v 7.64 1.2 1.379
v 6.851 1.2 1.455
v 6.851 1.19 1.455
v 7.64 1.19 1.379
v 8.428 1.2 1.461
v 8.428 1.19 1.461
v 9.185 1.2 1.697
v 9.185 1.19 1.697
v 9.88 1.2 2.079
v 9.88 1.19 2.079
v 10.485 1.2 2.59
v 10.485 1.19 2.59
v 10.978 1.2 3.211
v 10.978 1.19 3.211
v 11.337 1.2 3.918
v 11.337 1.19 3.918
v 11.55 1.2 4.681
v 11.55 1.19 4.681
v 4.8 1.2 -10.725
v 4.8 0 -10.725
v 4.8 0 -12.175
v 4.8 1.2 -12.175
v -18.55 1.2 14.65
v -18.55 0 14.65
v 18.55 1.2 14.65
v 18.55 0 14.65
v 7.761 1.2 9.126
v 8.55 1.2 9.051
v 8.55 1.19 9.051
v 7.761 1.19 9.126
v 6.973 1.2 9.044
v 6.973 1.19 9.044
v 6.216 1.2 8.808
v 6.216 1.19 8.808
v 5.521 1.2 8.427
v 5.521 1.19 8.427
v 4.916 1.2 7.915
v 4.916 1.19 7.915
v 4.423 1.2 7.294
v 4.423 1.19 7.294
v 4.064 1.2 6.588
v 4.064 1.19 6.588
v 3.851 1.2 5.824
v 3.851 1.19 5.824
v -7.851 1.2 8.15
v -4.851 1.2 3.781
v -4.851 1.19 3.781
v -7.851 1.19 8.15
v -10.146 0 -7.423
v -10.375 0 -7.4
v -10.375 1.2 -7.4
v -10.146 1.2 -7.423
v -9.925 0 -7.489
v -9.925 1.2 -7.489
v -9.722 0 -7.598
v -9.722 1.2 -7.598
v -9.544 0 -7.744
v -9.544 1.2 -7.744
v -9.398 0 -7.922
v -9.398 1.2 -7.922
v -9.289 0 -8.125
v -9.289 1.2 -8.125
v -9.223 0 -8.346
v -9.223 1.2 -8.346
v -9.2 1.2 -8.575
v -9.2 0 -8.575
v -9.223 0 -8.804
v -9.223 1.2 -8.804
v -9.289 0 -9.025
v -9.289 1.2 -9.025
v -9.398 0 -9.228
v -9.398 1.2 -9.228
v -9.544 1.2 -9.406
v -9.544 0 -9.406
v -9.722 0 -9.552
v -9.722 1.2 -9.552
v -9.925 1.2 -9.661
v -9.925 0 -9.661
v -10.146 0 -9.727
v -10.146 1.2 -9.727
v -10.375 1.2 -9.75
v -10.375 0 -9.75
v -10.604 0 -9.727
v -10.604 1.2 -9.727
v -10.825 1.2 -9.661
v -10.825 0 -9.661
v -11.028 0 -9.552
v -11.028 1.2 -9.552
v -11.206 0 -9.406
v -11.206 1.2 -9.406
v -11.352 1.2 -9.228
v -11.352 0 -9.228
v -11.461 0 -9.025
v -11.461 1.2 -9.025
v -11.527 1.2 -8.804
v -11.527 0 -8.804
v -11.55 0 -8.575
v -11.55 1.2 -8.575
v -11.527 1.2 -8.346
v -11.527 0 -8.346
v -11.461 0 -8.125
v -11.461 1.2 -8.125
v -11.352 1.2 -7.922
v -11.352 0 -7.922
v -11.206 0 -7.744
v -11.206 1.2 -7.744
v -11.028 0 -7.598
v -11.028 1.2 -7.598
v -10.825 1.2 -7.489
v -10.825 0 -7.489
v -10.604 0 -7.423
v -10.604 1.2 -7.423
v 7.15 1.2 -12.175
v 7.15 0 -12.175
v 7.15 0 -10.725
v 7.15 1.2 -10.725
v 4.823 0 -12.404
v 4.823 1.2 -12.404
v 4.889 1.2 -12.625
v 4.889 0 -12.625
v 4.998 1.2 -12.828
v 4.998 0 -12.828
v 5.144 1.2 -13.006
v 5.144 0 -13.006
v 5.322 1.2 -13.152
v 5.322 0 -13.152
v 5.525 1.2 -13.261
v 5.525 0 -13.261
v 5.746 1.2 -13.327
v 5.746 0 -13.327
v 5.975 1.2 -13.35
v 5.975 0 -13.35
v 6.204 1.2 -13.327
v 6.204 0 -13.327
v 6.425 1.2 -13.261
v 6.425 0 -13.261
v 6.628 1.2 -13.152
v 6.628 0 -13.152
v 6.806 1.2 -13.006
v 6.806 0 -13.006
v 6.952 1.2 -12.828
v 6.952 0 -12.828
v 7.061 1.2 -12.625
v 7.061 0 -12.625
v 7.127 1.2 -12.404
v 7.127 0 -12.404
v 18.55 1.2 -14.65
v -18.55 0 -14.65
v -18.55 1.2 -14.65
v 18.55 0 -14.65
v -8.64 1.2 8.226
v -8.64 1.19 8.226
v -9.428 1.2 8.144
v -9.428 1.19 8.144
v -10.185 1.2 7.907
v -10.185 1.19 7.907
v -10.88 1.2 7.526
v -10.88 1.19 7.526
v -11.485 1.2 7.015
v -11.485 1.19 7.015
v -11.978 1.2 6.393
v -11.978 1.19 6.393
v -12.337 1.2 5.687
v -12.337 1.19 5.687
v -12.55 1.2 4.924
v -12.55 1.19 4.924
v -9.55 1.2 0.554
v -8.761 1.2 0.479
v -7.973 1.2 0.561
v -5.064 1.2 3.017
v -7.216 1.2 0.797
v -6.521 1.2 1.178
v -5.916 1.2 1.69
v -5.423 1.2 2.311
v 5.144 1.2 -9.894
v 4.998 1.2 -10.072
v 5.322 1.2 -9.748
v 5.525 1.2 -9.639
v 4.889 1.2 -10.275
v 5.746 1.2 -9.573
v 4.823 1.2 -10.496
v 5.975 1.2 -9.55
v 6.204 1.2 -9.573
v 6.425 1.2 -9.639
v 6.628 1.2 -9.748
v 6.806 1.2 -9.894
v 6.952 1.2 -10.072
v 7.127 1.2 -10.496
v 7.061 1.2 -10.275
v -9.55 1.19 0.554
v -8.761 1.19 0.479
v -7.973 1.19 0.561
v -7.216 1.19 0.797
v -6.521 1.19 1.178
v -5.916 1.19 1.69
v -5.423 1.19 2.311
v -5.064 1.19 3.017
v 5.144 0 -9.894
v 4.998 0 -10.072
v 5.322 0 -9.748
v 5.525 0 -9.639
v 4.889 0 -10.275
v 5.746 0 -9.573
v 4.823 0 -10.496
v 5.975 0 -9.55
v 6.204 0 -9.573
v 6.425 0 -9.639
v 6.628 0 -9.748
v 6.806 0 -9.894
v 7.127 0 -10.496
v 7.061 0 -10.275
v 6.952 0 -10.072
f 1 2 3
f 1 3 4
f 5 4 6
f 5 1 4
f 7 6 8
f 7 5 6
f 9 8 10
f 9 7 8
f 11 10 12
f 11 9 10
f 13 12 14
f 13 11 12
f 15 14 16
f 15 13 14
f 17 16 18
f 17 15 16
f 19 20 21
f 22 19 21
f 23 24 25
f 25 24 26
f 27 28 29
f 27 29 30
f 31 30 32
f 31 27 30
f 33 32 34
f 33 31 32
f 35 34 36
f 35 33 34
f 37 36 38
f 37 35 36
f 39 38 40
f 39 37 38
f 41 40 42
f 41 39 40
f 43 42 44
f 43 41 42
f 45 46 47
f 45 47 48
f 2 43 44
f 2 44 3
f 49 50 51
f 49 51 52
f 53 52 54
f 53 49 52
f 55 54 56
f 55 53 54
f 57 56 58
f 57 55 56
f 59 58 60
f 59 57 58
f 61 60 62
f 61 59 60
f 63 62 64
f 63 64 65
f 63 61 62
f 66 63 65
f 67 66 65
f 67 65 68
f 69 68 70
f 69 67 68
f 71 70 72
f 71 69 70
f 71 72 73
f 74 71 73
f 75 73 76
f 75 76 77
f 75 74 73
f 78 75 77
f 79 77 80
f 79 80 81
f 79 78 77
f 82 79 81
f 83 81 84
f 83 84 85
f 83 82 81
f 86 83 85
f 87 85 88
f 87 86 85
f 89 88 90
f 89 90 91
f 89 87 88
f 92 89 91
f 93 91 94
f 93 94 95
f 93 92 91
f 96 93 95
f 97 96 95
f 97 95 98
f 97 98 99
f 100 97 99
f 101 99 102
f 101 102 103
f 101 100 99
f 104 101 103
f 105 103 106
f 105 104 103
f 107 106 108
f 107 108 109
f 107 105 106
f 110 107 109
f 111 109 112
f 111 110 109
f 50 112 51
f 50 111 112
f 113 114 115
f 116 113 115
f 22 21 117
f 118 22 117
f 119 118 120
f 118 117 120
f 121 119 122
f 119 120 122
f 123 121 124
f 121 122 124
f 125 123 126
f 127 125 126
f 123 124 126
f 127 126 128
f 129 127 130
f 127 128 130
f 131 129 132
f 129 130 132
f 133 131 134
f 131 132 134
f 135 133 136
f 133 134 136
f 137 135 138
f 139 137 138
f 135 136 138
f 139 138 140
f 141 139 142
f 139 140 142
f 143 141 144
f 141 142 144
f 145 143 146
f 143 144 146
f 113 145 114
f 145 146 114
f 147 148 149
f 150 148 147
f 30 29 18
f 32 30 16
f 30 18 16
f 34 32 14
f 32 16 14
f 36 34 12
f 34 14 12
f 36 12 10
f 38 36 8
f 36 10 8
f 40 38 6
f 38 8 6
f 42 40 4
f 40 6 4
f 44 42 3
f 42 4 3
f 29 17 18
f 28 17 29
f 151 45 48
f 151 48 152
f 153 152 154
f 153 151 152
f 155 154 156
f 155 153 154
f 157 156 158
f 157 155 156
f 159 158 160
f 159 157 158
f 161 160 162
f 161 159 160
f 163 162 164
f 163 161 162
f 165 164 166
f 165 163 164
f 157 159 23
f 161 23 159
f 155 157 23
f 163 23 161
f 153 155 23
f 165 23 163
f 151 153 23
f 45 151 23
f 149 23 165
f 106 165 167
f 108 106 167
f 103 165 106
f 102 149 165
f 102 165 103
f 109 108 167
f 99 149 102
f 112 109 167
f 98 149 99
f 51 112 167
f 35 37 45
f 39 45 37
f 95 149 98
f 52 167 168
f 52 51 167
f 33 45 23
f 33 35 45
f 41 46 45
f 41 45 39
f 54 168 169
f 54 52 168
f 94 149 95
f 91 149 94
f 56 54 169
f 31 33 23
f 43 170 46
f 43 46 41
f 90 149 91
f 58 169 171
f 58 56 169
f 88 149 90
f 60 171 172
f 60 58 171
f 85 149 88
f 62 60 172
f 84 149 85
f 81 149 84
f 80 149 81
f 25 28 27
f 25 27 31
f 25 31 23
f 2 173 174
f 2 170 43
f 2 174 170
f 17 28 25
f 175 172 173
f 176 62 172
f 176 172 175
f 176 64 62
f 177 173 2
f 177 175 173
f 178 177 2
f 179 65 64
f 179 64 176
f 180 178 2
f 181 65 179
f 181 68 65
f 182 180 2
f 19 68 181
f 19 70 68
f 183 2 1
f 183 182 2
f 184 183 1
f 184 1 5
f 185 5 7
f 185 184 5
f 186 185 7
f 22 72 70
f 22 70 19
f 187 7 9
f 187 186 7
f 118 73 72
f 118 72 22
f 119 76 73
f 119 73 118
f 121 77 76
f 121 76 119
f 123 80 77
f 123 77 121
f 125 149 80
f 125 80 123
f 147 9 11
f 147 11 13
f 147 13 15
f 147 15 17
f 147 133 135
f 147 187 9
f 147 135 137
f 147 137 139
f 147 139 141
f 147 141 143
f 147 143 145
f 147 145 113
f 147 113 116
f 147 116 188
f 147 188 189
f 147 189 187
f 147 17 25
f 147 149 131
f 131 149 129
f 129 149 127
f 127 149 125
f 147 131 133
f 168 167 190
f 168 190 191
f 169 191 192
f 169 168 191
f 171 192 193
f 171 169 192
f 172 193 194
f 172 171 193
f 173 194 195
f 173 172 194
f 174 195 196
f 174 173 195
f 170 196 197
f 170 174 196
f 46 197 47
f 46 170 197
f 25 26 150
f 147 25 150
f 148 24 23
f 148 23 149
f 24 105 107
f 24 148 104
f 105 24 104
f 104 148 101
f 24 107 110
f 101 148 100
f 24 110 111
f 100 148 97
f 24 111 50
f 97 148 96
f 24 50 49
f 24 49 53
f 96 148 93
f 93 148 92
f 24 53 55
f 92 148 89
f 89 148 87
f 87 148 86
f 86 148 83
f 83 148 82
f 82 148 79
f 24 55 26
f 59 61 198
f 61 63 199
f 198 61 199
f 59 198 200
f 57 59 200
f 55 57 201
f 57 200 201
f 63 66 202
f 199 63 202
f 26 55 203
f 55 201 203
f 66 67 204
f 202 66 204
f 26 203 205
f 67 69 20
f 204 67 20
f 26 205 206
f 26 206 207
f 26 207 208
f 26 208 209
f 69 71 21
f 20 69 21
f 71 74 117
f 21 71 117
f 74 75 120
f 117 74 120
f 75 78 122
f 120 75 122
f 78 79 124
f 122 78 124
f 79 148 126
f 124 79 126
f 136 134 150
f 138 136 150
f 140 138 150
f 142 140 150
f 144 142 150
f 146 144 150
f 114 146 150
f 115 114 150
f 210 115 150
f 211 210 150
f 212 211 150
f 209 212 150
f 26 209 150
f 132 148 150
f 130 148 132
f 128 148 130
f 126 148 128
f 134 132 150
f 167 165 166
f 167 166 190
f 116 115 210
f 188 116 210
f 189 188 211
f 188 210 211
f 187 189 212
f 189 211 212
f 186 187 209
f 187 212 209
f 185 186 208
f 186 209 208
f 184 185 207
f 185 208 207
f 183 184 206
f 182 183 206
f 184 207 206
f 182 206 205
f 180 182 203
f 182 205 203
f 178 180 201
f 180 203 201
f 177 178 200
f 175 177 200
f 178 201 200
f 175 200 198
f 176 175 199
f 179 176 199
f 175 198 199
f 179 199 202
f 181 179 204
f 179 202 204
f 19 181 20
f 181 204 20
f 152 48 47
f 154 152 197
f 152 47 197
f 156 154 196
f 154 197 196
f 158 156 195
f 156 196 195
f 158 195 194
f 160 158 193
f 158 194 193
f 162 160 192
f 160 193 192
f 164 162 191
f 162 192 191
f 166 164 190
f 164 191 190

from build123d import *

# Parameters (mm, degrees)
ESQUISSE1_W             = 37.1
ESQUISSE1_H             = 29.3
ESQUISSE1_R             = 1.175
BOSS_EXTRU_1_DEPTH      = 1.2
ENL_V_MAT_EXTRU_1_DEPTH = 0.01


with BuildPart() as part:
    # Esquisse1 → Boss.-Extru.1 (new body)
    with BuildSketch(Plane(origin=(0, 0, 0), x_dir=(1, 0, 0), z_dir=(0, 1, 0))):
        Rectangle(ESQUISSE1_W, ESQUISSE1_H)
        with Locations(Location((-10.375, 8.575, 0), (0, 0, 270))):
            Circle(ESQUISSE1_R, mode=Mode.SUBTRACT)
        with BuildLine():
            Line((7.15, 12.175), (7.15, 10.725))
            ThreePointArc((7.15, 10.725), (5.975, 9.55), (4.8, 10.725))
            Line((4.8, 10.725), (4.8, 12.175))
            ThreePointArc((4.8, 12.175), (5.975, 13.35), (7.15, 12.175))
        make_face(mode=Mode.SUBTRACT)
    extrude(amount=BOSS_EXTRU_1_DEPTH)

    # Esquisse2 → Enlèv. mat.-Extru.1 (cut)
    with BuildSketch(Plane(origin=(0, 1.2, 0), x_dir=(1, 0, 0), z_dir=(0, 1, 0))):
        with BuildLine():
            Line((-12.55, -4.923584906), (-9.55, -0.554374451))
            ThreePointArc((-9.55, -0.554374451), (-6.521273623, -1.1783268), (-4.851037813, -3.780789545))
            Line((-4.851037813, -3.780789545), (-7.851037813, -8.15))
            ThreePointArc((-7.851037813, -8.15), (-10.879764189, -7.52604765), (-12.55, -4.923584906))
        make_face()
        with BuildLine():
            Line((3.851037813, -5.824109363), (6.851037813, -1.454898908))
            ThreePointArc((6.851037813, -1.454898908), (9.879764189, -2.078851257), (11.55, -4.681314002))
            Line((11.55, -4.681314002), (8.55, -9.050524457))
            ThreePointArc((8.55, -9.050524457), (5.521273623, -8.426572107), (3.851037813, -5.824109363))
        make_face()
    extrude(amount=-ENL_V_MAT_EXTRU_1_DEPTH, mode=Mode.SUBTRACT)


solid = part.part
